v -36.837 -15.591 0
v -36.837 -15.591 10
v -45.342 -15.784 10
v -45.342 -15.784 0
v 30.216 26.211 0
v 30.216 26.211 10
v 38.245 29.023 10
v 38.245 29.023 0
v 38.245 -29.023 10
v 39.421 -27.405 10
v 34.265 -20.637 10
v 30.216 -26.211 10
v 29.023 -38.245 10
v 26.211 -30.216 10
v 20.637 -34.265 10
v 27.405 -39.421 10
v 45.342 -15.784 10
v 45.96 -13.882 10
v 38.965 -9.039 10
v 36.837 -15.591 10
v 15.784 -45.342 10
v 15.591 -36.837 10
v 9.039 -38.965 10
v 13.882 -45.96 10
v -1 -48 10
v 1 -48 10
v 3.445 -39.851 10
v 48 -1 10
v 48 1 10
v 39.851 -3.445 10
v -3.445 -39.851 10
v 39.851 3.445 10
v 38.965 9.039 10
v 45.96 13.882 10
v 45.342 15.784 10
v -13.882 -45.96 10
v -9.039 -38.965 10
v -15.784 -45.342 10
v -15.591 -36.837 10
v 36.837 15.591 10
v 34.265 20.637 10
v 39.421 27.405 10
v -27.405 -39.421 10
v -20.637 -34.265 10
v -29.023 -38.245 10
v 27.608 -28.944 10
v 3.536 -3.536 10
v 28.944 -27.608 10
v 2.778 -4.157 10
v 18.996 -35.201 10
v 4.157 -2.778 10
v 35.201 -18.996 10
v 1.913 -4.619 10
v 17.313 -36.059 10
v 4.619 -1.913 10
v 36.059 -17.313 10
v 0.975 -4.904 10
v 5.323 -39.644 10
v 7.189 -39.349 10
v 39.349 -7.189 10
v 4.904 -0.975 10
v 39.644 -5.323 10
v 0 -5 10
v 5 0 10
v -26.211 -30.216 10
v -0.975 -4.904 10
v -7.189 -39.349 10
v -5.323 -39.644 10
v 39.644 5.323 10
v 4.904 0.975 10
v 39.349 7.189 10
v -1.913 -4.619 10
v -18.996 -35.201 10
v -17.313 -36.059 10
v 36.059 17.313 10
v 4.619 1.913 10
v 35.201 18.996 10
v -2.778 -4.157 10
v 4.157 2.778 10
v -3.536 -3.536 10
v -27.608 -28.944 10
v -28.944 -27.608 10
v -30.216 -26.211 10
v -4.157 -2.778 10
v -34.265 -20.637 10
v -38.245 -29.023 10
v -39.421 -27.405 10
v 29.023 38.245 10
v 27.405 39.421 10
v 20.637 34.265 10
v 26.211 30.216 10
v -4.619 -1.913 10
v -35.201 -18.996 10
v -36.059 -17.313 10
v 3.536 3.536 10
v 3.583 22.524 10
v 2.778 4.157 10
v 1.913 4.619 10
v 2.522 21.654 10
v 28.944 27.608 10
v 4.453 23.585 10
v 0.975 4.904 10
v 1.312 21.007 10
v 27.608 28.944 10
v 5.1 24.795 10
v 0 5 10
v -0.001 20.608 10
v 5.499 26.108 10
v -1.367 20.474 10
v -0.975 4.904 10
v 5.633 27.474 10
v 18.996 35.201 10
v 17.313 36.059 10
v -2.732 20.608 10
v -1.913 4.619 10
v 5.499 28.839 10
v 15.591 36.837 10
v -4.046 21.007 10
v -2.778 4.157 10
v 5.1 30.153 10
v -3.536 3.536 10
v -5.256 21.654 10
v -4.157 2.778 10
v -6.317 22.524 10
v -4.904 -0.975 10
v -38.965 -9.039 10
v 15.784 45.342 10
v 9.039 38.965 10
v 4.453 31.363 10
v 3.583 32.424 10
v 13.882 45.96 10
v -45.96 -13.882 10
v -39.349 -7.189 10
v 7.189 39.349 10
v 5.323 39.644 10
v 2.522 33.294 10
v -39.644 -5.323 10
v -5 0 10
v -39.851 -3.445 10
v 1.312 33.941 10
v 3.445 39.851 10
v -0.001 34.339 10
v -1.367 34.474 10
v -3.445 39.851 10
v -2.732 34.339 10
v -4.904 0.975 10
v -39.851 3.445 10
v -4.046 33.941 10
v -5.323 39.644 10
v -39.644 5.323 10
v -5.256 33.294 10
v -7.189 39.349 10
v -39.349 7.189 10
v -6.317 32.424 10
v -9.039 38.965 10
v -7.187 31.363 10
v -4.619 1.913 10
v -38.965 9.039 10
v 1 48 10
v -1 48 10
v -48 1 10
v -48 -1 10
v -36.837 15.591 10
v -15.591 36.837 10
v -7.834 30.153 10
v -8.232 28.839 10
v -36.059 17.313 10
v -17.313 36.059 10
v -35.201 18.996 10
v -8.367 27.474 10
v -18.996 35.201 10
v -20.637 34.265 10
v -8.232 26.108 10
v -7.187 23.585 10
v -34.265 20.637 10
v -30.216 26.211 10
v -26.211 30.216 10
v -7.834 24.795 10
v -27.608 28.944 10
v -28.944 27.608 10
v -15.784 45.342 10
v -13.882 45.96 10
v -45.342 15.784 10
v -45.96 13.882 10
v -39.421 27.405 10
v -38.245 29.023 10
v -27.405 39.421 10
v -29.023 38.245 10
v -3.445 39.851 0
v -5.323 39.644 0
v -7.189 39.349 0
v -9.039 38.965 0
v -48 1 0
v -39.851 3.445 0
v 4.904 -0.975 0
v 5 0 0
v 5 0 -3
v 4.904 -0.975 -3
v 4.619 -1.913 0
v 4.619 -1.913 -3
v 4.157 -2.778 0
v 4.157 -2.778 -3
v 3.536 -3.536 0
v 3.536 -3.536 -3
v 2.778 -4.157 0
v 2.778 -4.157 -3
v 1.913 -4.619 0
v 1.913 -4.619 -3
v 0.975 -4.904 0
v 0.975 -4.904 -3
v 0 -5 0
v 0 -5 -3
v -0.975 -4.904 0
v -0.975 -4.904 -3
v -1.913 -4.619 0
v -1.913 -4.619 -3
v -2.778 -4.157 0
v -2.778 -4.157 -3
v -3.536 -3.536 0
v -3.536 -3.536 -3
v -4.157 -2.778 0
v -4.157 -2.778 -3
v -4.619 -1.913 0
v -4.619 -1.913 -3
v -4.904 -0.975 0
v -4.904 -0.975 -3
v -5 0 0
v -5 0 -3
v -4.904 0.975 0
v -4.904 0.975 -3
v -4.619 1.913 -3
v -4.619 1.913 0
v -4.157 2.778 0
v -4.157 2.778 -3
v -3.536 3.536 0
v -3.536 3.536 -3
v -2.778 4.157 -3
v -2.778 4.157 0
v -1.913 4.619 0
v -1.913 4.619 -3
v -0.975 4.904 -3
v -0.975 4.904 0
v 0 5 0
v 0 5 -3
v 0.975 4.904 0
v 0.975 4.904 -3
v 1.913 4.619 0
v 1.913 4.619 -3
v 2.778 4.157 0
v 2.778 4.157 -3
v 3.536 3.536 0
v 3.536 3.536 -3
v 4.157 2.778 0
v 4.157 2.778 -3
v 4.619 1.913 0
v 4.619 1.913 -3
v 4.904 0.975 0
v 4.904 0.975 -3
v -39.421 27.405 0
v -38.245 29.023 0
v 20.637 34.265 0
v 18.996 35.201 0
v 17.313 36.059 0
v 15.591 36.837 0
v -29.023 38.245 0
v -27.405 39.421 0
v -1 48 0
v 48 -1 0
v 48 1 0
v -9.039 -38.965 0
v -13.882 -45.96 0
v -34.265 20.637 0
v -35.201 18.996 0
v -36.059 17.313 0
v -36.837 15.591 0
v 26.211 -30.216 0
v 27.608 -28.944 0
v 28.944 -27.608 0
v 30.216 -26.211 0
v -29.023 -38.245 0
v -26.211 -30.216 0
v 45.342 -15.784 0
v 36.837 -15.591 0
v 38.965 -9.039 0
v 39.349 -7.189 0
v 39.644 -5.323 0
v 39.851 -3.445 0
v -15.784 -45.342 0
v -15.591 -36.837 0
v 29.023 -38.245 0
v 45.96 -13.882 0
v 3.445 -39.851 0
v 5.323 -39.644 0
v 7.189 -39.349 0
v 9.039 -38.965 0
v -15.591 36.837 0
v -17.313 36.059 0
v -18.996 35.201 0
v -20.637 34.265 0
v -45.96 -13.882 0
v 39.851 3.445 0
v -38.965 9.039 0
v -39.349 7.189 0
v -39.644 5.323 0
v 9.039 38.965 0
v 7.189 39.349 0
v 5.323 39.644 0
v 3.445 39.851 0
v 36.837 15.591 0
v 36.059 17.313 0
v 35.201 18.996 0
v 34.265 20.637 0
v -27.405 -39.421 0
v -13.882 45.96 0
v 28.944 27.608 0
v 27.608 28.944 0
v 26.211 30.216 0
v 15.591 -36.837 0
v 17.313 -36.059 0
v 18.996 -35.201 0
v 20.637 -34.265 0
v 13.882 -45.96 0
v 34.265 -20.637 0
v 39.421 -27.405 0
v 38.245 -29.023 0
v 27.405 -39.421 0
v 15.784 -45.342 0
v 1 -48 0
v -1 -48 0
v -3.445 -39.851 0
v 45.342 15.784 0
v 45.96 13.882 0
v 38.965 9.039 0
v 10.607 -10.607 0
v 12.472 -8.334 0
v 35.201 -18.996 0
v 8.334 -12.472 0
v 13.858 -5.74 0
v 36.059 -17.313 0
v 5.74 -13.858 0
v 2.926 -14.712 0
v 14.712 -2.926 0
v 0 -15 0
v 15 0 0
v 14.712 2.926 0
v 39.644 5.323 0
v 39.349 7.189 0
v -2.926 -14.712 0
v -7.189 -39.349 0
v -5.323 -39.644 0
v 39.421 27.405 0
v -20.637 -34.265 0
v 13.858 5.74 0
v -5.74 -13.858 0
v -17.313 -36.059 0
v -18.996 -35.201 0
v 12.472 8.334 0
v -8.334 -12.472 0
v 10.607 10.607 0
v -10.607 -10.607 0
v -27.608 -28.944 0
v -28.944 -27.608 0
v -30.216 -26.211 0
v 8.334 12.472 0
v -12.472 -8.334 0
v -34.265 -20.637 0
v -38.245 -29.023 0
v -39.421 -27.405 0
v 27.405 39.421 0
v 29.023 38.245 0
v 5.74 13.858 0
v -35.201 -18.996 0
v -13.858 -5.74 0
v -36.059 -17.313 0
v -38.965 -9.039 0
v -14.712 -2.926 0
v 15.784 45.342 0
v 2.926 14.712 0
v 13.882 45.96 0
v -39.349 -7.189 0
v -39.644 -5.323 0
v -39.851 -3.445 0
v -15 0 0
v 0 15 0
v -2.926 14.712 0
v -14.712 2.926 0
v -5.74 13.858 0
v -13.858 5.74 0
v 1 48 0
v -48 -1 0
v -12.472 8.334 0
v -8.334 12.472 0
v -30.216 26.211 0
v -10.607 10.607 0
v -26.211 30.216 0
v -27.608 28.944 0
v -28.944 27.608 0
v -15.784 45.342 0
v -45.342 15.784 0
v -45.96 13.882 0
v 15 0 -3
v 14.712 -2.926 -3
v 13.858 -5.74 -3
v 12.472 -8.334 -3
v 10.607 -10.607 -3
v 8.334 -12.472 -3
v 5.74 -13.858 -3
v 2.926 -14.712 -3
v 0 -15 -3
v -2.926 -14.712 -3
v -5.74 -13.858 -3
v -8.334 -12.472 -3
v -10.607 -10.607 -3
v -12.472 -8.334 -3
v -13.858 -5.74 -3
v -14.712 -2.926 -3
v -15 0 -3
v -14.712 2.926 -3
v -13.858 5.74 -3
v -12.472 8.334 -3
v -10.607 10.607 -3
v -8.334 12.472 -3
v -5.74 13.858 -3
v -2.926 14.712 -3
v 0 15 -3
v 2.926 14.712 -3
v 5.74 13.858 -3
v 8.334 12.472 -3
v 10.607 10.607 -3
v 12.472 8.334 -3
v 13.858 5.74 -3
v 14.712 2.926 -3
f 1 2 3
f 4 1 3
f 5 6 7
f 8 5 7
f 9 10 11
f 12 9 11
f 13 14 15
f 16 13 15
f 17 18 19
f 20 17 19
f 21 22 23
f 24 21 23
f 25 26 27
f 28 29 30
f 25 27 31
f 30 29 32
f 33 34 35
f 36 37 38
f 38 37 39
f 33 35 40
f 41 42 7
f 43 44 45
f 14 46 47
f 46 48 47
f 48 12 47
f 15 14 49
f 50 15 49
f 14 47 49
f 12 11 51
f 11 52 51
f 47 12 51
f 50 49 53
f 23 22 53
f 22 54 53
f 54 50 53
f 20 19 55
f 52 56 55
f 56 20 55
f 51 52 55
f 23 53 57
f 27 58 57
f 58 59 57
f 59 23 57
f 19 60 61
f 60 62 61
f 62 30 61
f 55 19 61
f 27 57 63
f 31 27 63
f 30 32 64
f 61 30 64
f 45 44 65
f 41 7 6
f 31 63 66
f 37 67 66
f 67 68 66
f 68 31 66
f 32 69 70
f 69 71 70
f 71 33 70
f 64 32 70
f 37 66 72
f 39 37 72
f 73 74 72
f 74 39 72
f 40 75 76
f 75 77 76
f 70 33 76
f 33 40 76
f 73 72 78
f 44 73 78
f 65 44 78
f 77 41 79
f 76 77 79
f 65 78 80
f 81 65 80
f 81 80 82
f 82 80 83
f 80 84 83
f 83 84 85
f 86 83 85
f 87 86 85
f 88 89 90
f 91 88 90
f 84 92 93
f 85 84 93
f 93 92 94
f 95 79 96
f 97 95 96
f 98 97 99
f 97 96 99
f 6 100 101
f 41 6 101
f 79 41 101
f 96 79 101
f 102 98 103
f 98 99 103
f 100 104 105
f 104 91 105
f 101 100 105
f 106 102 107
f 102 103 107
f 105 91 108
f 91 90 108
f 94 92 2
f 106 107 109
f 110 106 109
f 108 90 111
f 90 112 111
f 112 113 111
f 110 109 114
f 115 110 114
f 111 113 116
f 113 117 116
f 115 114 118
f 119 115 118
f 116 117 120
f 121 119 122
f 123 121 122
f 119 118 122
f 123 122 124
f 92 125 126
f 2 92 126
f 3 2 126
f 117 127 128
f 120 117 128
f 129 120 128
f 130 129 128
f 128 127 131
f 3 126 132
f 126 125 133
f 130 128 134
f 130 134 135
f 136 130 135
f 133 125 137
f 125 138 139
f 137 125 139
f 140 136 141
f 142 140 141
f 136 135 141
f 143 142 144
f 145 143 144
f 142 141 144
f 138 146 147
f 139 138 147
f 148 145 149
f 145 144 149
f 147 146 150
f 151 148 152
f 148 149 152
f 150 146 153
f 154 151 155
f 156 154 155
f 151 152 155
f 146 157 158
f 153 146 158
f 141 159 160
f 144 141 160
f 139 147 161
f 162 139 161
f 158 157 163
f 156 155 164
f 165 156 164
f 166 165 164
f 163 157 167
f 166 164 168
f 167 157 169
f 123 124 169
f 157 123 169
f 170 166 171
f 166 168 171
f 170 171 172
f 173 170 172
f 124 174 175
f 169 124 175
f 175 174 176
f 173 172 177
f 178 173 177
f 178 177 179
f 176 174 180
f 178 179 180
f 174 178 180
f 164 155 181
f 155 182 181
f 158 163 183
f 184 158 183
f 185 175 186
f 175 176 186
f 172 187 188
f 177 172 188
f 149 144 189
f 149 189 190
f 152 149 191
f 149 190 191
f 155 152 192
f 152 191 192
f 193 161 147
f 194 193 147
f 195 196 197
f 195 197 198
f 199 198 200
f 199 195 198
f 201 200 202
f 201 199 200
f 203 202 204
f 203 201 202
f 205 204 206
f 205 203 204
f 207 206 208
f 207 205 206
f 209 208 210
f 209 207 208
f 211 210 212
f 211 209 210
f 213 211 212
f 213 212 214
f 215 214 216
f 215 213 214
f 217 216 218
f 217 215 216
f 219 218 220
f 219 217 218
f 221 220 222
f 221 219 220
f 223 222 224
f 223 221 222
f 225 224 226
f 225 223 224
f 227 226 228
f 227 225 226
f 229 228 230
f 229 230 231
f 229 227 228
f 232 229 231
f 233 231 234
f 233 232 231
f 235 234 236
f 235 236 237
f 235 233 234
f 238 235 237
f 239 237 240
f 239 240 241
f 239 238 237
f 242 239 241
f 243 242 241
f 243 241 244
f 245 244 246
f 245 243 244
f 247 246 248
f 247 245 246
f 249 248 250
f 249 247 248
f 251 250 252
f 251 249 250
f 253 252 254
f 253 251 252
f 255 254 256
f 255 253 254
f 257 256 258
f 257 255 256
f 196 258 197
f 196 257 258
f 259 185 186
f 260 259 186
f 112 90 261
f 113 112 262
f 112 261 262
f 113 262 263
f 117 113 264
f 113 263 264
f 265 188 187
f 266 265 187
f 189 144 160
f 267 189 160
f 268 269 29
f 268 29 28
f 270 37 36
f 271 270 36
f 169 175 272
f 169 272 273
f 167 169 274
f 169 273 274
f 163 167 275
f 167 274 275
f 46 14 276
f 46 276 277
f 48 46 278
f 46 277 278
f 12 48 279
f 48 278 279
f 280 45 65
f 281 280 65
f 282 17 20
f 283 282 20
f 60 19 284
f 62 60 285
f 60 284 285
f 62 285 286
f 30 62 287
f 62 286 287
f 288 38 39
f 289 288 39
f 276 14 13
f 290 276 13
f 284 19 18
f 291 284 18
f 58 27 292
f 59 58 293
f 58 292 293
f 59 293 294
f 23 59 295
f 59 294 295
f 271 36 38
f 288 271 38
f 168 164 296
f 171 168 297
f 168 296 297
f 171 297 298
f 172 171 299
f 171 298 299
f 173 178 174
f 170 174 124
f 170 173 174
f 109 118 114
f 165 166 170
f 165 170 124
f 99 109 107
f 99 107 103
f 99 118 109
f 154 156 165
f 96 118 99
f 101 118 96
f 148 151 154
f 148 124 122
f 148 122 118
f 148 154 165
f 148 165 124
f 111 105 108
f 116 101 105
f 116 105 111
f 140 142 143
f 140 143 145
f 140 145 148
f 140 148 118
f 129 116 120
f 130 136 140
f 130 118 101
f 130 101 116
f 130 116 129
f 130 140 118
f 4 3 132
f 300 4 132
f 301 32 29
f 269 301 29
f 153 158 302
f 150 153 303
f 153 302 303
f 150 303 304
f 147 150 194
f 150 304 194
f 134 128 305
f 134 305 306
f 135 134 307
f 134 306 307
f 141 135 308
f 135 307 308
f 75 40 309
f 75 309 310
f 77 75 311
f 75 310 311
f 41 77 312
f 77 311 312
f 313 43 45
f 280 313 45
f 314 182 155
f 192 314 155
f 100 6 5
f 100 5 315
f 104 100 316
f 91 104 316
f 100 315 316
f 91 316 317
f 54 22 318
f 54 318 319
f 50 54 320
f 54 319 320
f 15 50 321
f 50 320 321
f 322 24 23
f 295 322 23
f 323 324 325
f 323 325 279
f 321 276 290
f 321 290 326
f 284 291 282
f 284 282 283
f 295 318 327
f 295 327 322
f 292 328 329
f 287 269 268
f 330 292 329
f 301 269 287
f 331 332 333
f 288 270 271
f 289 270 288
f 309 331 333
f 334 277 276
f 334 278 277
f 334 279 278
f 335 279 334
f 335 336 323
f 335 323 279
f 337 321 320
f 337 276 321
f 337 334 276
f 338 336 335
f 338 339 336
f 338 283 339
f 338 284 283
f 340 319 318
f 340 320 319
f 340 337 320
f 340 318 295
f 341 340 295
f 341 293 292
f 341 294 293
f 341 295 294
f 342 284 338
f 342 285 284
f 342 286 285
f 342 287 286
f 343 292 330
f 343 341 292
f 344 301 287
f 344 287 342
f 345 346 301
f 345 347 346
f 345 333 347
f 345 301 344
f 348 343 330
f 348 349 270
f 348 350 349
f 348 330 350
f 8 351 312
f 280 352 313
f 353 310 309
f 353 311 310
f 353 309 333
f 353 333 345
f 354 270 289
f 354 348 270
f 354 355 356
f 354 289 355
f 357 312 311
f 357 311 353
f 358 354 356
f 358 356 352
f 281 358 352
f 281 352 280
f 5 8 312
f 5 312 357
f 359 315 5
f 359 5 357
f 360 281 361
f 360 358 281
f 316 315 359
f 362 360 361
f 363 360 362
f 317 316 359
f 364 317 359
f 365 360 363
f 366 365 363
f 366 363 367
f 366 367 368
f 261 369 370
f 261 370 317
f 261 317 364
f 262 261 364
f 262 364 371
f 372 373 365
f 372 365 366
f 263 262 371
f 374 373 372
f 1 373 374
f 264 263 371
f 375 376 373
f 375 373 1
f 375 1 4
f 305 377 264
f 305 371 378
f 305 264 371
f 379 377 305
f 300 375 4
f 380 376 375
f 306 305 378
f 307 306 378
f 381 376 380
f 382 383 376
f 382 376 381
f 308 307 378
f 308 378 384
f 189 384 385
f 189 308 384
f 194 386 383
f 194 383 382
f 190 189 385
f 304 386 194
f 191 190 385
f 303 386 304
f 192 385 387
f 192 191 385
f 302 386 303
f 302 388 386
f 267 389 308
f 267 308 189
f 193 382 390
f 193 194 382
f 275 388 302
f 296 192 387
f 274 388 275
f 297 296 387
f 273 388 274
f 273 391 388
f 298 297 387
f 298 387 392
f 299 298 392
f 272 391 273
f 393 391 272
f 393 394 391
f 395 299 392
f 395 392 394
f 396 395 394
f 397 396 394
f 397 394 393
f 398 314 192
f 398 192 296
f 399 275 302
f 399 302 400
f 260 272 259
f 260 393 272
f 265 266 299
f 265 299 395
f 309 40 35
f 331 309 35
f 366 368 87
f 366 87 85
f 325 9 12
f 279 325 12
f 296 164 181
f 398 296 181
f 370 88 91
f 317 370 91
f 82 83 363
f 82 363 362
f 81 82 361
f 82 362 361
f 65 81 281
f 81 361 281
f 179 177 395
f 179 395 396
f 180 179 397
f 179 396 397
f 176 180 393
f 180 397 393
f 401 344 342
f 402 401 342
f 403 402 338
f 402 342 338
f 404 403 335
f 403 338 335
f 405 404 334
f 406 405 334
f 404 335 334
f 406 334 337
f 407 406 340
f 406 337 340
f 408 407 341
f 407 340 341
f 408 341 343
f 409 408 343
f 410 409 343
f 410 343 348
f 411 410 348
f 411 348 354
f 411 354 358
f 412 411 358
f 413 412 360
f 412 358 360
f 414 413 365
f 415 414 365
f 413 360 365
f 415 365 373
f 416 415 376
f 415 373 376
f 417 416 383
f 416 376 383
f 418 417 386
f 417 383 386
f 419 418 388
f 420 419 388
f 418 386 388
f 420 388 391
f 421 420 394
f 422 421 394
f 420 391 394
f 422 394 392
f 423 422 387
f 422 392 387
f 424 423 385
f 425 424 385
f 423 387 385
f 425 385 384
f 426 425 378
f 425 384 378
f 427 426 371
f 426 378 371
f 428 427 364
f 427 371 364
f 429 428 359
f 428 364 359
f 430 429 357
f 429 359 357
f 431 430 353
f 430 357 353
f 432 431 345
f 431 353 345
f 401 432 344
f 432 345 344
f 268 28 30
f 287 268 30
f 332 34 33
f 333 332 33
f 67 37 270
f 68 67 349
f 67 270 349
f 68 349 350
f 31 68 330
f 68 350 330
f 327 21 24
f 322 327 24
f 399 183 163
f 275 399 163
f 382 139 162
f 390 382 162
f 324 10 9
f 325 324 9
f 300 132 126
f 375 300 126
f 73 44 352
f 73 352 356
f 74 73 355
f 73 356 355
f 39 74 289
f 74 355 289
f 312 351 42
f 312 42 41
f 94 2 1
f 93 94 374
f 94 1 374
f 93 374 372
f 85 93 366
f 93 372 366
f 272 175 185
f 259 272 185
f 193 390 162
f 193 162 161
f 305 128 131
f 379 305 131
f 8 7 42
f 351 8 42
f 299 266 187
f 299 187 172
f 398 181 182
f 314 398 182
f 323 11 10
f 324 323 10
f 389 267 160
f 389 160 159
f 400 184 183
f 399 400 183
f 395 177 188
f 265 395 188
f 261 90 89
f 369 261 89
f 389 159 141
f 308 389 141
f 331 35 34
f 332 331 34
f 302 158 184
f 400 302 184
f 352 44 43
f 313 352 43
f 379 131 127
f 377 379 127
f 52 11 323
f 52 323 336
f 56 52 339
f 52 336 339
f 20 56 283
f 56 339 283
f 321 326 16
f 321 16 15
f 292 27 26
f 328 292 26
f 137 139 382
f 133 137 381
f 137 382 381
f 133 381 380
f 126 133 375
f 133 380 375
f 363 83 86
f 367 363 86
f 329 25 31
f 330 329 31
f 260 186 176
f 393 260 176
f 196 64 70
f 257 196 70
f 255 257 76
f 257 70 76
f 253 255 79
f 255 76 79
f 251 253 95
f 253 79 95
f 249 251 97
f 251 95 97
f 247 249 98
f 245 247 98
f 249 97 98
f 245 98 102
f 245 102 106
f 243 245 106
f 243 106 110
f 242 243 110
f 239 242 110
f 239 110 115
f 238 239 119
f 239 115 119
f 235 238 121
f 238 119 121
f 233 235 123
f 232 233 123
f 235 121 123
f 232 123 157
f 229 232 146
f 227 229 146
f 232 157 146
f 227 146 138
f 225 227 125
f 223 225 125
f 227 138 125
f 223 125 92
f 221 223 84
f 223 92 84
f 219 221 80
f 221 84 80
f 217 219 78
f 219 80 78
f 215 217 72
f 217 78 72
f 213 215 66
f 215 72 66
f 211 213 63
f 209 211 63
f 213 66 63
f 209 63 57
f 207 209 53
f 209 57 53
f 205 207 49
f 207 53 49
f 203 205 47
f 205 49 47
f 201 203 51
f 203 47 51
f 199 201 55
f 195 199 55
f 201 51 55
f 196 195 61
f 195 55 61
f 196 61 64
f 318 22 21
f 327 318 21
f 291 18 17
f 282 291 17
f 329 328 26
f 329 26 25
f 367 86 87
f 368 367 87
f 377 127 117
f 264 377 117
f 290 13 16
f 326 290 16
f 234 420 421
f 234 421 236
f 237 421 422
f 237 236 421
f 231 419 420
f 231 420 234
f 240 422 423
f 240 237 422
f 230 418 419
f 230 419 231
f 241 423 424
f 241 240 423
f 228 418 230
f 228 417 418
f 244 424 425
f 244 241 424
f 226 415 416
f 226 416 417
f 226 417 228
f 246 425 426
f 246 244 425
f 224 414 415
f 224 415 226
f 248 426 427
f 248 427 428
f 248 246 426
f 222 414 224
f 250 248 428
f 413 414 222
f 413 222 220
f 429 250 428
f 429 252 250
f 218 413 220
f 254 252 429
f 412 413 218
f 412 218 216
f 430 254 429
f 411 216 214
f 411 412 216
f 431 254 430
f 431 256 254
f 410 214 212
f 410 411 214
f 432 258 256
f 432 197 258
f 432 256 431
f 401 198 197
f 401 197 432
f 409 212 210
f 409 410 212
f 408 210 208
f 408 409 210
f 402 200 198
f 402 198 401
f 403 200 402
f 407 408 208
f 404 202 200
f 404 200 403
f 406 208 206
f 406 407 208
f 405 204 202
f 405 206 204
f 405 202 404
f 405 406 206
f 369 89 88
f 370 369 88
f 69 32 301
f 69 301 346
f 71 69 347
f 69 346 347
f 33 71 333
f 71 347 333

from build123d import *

# Parameters (mm, degrees)
SKETCH1_R           = 40
BOSS_EXTRUDE1_DEPTH = 10
SKETCH2_R           = 5
CUT_EXTRUDE1_DEPTH  = 10
BOSS_EXTRUDE2_DEPTH = 10
SKETCH4_R           = 5
BOSS_EXTRUDE3_DEPTH = 0.0001
SKETCH5_R           = 7
BOSS_EXTRUDE4_DEPTH = 0.0001
SKETCH6_R           = 15
BOSS_EXTRUDE5_DEPTH = 3
CUT_EXTRUDE2_START  = -3
SKETCH7_R           = 5
CUT_EXTRUDE2_DEPTH  = 3


with BuildPart() as part:
    # Sketch1 → Boss-Extrude1 (new body)
    with BuildSketch(Plane.XY):
        Circle(SKETCH1_R)
    extrude(amount=BOSS_EXTRUDE1_DEPTH)

    # Sketch2 → Cut-Extrude1 (cut)
    with BuildSketch(Plane.XY.offset(10)):
        Circle(SKETCH2_R)
    extrude(amount=-CUT_EXTRUDE1_DEPTH, mode=Mode.SUBTRACT)

    # Sketch3 → Boss-Extrude2 (add)
    with BuildSketch(Plane.XY.offset(10)):
        Polygon((-1, 48), (1, 48), (4, 38), (-4, 38), align=None)
        Polygon((7.938419721, 37.376215597), (13.881759214, 45.959729777), (15.783872246, 45.341695788), (15.546871851, 34.904079642), align=None)
        Polygon((19.09977161, 33.093786795), (27.404675116, 39.420600982), (29.022709104, 38.245030478), (25.571907565, 28.391504777), align=None)
        Polygon((28.391504777, 25.571907565), (38.245030478, 29.022709104), (39.420600982, 27.404675116), (33.093786795, 19.09977161), align=None)
        Polygon((34.904079642, 15.546871851), (45.341695788, 15.783872246), (45.959729777, 13.881759214), (37.376215597, 7.938419721), align=None)
        Polygon((38, 4), (48, 1), (48, -1), (38, -4), align=None)
        Polygon((37.376215597, -7.938419721), (45.959729777, -13.881759214), (45.341695788, -15.783872246), (34.904079642, -15.546871851), align=None)
        Polygon((33.093786795, -19.09977161), (39.420600982, -27.404675116), (38.245030478, -29.022709104), (28.391504777, -25.571907565), align=None)
        Polygon((25.571907565, -28.391504777), (29.022709104, -38.245030478), (27.404675116, -39.420600982), (19.09977161, -33.093786795), align=None)
        Polygon((15.546871851, -34.904079642), (15.783872246, -45.341695788), (13.881759214, -45.959729777), (7.938419721, -37.376215597), align=None)
        Polygon((4, -38), (1, -48), (-1, -48), (-4, -38), align=None)
        Polygon((-7.938419721, -37.376215597), (-13.881759214, -45.959729777), (-15.783872246, -45.341695788), (-15.546871851, -34.904079642), align=None)
        Polygon((-19.09977161, -33.093786795), (-27.404675116, -39.420600982), (-29.022709104, -38.245030478), (-25.571907565, -28.391504777), align=None)
        Polygon((-28.391504777, -25.571907565), (-38.245030478, -29.022709104), (-39.420600982, -27.404675116), (-33.093786795, -19.09977161), align=None)
        Polygon((-34.904079642, -15.546871851), (-45.341695788, -15.783872246), (-45.959729777, -13.881759214), (-37.376215597, -7.938419721), align=None)
        Polygon((-38, -4), (-48, -1), (-48, 1), (-38, 4), align=None)
        Polygon((-37.376215597, 7.938419721), (-45.959729777, 13.881759214), (-45.341695788, 15.783872246), (-34.904079642, 15.546871851), align=None)
        Polygon((-33.093786795, 19.09977161), (-39.420600982, 27.404675116), (-38.245030478, 29.022709104), (-28.391504777, 25.571907565), align=None)
        Polygon((-25.571907565, 28.391504777), (-29.022709104, 38.245030478), (-27.404675116, 39.420600982), (-19.09977161, 33.093786795), align=None)
        Polygon((-15.546871851, 34.904079642), (-15.783872246, 45.341695788), (-13.881759214, 45.959729777), (-7.938419721, 37.376215597), align=None)
    extrude(amount=-BOSS_EXTRUDE2_DEPTH)

    # Sketch4 → Boss-Extrude3 (add)
    with BuildSketch(Plane.XY.offset(10)):
        with Locations((-1.366858005, 27.473845905)):
            Circle(SKETCH4_R)
    extrude(amount=BOSS_EXTRUDE3_DEPTH)

    # Sketch5 → Boss-Extrude4 (add)
    with BuildSketch(Plane.XY.offset(10)):
        with Locations((-1.366858005, 27.473845905)):
            Circle(SKETCH5_R)
    extrude(amount=BOSS_EXTRUDE4_DEPTH)

    # Sketch6 → Boss-Extrude5 (add)
    with BuildSketch(Plane(origin=(0, 0, 0), x_dir=(-1, 0, 0), z_dir=(0, 0, -1))):
        with Locations(Location((0, 0, 0), (0, 0, 180))):
            Circle(SKETCH6_R)
    extrude(amount=BOSS_EXTRUDE5_DEPTH)

    # Sketch7 → Cut-Extrude2 (cut)
    with BuildSketch(Plane(origin=(0, 0, -3), x_dir=(-1, 0, 0), z_dir=(0, 0, -1)).offset(CUT_EXTRUDE2_START)):
        with Locations(Location((0, 0, 0), (0, 0, 180))):
            Circle(SKETCH7_R)
    extrude(amount=CUT_EXTRUDE2_DEPTH, mode=Mode.SUBTRACT)


solid = part.part
